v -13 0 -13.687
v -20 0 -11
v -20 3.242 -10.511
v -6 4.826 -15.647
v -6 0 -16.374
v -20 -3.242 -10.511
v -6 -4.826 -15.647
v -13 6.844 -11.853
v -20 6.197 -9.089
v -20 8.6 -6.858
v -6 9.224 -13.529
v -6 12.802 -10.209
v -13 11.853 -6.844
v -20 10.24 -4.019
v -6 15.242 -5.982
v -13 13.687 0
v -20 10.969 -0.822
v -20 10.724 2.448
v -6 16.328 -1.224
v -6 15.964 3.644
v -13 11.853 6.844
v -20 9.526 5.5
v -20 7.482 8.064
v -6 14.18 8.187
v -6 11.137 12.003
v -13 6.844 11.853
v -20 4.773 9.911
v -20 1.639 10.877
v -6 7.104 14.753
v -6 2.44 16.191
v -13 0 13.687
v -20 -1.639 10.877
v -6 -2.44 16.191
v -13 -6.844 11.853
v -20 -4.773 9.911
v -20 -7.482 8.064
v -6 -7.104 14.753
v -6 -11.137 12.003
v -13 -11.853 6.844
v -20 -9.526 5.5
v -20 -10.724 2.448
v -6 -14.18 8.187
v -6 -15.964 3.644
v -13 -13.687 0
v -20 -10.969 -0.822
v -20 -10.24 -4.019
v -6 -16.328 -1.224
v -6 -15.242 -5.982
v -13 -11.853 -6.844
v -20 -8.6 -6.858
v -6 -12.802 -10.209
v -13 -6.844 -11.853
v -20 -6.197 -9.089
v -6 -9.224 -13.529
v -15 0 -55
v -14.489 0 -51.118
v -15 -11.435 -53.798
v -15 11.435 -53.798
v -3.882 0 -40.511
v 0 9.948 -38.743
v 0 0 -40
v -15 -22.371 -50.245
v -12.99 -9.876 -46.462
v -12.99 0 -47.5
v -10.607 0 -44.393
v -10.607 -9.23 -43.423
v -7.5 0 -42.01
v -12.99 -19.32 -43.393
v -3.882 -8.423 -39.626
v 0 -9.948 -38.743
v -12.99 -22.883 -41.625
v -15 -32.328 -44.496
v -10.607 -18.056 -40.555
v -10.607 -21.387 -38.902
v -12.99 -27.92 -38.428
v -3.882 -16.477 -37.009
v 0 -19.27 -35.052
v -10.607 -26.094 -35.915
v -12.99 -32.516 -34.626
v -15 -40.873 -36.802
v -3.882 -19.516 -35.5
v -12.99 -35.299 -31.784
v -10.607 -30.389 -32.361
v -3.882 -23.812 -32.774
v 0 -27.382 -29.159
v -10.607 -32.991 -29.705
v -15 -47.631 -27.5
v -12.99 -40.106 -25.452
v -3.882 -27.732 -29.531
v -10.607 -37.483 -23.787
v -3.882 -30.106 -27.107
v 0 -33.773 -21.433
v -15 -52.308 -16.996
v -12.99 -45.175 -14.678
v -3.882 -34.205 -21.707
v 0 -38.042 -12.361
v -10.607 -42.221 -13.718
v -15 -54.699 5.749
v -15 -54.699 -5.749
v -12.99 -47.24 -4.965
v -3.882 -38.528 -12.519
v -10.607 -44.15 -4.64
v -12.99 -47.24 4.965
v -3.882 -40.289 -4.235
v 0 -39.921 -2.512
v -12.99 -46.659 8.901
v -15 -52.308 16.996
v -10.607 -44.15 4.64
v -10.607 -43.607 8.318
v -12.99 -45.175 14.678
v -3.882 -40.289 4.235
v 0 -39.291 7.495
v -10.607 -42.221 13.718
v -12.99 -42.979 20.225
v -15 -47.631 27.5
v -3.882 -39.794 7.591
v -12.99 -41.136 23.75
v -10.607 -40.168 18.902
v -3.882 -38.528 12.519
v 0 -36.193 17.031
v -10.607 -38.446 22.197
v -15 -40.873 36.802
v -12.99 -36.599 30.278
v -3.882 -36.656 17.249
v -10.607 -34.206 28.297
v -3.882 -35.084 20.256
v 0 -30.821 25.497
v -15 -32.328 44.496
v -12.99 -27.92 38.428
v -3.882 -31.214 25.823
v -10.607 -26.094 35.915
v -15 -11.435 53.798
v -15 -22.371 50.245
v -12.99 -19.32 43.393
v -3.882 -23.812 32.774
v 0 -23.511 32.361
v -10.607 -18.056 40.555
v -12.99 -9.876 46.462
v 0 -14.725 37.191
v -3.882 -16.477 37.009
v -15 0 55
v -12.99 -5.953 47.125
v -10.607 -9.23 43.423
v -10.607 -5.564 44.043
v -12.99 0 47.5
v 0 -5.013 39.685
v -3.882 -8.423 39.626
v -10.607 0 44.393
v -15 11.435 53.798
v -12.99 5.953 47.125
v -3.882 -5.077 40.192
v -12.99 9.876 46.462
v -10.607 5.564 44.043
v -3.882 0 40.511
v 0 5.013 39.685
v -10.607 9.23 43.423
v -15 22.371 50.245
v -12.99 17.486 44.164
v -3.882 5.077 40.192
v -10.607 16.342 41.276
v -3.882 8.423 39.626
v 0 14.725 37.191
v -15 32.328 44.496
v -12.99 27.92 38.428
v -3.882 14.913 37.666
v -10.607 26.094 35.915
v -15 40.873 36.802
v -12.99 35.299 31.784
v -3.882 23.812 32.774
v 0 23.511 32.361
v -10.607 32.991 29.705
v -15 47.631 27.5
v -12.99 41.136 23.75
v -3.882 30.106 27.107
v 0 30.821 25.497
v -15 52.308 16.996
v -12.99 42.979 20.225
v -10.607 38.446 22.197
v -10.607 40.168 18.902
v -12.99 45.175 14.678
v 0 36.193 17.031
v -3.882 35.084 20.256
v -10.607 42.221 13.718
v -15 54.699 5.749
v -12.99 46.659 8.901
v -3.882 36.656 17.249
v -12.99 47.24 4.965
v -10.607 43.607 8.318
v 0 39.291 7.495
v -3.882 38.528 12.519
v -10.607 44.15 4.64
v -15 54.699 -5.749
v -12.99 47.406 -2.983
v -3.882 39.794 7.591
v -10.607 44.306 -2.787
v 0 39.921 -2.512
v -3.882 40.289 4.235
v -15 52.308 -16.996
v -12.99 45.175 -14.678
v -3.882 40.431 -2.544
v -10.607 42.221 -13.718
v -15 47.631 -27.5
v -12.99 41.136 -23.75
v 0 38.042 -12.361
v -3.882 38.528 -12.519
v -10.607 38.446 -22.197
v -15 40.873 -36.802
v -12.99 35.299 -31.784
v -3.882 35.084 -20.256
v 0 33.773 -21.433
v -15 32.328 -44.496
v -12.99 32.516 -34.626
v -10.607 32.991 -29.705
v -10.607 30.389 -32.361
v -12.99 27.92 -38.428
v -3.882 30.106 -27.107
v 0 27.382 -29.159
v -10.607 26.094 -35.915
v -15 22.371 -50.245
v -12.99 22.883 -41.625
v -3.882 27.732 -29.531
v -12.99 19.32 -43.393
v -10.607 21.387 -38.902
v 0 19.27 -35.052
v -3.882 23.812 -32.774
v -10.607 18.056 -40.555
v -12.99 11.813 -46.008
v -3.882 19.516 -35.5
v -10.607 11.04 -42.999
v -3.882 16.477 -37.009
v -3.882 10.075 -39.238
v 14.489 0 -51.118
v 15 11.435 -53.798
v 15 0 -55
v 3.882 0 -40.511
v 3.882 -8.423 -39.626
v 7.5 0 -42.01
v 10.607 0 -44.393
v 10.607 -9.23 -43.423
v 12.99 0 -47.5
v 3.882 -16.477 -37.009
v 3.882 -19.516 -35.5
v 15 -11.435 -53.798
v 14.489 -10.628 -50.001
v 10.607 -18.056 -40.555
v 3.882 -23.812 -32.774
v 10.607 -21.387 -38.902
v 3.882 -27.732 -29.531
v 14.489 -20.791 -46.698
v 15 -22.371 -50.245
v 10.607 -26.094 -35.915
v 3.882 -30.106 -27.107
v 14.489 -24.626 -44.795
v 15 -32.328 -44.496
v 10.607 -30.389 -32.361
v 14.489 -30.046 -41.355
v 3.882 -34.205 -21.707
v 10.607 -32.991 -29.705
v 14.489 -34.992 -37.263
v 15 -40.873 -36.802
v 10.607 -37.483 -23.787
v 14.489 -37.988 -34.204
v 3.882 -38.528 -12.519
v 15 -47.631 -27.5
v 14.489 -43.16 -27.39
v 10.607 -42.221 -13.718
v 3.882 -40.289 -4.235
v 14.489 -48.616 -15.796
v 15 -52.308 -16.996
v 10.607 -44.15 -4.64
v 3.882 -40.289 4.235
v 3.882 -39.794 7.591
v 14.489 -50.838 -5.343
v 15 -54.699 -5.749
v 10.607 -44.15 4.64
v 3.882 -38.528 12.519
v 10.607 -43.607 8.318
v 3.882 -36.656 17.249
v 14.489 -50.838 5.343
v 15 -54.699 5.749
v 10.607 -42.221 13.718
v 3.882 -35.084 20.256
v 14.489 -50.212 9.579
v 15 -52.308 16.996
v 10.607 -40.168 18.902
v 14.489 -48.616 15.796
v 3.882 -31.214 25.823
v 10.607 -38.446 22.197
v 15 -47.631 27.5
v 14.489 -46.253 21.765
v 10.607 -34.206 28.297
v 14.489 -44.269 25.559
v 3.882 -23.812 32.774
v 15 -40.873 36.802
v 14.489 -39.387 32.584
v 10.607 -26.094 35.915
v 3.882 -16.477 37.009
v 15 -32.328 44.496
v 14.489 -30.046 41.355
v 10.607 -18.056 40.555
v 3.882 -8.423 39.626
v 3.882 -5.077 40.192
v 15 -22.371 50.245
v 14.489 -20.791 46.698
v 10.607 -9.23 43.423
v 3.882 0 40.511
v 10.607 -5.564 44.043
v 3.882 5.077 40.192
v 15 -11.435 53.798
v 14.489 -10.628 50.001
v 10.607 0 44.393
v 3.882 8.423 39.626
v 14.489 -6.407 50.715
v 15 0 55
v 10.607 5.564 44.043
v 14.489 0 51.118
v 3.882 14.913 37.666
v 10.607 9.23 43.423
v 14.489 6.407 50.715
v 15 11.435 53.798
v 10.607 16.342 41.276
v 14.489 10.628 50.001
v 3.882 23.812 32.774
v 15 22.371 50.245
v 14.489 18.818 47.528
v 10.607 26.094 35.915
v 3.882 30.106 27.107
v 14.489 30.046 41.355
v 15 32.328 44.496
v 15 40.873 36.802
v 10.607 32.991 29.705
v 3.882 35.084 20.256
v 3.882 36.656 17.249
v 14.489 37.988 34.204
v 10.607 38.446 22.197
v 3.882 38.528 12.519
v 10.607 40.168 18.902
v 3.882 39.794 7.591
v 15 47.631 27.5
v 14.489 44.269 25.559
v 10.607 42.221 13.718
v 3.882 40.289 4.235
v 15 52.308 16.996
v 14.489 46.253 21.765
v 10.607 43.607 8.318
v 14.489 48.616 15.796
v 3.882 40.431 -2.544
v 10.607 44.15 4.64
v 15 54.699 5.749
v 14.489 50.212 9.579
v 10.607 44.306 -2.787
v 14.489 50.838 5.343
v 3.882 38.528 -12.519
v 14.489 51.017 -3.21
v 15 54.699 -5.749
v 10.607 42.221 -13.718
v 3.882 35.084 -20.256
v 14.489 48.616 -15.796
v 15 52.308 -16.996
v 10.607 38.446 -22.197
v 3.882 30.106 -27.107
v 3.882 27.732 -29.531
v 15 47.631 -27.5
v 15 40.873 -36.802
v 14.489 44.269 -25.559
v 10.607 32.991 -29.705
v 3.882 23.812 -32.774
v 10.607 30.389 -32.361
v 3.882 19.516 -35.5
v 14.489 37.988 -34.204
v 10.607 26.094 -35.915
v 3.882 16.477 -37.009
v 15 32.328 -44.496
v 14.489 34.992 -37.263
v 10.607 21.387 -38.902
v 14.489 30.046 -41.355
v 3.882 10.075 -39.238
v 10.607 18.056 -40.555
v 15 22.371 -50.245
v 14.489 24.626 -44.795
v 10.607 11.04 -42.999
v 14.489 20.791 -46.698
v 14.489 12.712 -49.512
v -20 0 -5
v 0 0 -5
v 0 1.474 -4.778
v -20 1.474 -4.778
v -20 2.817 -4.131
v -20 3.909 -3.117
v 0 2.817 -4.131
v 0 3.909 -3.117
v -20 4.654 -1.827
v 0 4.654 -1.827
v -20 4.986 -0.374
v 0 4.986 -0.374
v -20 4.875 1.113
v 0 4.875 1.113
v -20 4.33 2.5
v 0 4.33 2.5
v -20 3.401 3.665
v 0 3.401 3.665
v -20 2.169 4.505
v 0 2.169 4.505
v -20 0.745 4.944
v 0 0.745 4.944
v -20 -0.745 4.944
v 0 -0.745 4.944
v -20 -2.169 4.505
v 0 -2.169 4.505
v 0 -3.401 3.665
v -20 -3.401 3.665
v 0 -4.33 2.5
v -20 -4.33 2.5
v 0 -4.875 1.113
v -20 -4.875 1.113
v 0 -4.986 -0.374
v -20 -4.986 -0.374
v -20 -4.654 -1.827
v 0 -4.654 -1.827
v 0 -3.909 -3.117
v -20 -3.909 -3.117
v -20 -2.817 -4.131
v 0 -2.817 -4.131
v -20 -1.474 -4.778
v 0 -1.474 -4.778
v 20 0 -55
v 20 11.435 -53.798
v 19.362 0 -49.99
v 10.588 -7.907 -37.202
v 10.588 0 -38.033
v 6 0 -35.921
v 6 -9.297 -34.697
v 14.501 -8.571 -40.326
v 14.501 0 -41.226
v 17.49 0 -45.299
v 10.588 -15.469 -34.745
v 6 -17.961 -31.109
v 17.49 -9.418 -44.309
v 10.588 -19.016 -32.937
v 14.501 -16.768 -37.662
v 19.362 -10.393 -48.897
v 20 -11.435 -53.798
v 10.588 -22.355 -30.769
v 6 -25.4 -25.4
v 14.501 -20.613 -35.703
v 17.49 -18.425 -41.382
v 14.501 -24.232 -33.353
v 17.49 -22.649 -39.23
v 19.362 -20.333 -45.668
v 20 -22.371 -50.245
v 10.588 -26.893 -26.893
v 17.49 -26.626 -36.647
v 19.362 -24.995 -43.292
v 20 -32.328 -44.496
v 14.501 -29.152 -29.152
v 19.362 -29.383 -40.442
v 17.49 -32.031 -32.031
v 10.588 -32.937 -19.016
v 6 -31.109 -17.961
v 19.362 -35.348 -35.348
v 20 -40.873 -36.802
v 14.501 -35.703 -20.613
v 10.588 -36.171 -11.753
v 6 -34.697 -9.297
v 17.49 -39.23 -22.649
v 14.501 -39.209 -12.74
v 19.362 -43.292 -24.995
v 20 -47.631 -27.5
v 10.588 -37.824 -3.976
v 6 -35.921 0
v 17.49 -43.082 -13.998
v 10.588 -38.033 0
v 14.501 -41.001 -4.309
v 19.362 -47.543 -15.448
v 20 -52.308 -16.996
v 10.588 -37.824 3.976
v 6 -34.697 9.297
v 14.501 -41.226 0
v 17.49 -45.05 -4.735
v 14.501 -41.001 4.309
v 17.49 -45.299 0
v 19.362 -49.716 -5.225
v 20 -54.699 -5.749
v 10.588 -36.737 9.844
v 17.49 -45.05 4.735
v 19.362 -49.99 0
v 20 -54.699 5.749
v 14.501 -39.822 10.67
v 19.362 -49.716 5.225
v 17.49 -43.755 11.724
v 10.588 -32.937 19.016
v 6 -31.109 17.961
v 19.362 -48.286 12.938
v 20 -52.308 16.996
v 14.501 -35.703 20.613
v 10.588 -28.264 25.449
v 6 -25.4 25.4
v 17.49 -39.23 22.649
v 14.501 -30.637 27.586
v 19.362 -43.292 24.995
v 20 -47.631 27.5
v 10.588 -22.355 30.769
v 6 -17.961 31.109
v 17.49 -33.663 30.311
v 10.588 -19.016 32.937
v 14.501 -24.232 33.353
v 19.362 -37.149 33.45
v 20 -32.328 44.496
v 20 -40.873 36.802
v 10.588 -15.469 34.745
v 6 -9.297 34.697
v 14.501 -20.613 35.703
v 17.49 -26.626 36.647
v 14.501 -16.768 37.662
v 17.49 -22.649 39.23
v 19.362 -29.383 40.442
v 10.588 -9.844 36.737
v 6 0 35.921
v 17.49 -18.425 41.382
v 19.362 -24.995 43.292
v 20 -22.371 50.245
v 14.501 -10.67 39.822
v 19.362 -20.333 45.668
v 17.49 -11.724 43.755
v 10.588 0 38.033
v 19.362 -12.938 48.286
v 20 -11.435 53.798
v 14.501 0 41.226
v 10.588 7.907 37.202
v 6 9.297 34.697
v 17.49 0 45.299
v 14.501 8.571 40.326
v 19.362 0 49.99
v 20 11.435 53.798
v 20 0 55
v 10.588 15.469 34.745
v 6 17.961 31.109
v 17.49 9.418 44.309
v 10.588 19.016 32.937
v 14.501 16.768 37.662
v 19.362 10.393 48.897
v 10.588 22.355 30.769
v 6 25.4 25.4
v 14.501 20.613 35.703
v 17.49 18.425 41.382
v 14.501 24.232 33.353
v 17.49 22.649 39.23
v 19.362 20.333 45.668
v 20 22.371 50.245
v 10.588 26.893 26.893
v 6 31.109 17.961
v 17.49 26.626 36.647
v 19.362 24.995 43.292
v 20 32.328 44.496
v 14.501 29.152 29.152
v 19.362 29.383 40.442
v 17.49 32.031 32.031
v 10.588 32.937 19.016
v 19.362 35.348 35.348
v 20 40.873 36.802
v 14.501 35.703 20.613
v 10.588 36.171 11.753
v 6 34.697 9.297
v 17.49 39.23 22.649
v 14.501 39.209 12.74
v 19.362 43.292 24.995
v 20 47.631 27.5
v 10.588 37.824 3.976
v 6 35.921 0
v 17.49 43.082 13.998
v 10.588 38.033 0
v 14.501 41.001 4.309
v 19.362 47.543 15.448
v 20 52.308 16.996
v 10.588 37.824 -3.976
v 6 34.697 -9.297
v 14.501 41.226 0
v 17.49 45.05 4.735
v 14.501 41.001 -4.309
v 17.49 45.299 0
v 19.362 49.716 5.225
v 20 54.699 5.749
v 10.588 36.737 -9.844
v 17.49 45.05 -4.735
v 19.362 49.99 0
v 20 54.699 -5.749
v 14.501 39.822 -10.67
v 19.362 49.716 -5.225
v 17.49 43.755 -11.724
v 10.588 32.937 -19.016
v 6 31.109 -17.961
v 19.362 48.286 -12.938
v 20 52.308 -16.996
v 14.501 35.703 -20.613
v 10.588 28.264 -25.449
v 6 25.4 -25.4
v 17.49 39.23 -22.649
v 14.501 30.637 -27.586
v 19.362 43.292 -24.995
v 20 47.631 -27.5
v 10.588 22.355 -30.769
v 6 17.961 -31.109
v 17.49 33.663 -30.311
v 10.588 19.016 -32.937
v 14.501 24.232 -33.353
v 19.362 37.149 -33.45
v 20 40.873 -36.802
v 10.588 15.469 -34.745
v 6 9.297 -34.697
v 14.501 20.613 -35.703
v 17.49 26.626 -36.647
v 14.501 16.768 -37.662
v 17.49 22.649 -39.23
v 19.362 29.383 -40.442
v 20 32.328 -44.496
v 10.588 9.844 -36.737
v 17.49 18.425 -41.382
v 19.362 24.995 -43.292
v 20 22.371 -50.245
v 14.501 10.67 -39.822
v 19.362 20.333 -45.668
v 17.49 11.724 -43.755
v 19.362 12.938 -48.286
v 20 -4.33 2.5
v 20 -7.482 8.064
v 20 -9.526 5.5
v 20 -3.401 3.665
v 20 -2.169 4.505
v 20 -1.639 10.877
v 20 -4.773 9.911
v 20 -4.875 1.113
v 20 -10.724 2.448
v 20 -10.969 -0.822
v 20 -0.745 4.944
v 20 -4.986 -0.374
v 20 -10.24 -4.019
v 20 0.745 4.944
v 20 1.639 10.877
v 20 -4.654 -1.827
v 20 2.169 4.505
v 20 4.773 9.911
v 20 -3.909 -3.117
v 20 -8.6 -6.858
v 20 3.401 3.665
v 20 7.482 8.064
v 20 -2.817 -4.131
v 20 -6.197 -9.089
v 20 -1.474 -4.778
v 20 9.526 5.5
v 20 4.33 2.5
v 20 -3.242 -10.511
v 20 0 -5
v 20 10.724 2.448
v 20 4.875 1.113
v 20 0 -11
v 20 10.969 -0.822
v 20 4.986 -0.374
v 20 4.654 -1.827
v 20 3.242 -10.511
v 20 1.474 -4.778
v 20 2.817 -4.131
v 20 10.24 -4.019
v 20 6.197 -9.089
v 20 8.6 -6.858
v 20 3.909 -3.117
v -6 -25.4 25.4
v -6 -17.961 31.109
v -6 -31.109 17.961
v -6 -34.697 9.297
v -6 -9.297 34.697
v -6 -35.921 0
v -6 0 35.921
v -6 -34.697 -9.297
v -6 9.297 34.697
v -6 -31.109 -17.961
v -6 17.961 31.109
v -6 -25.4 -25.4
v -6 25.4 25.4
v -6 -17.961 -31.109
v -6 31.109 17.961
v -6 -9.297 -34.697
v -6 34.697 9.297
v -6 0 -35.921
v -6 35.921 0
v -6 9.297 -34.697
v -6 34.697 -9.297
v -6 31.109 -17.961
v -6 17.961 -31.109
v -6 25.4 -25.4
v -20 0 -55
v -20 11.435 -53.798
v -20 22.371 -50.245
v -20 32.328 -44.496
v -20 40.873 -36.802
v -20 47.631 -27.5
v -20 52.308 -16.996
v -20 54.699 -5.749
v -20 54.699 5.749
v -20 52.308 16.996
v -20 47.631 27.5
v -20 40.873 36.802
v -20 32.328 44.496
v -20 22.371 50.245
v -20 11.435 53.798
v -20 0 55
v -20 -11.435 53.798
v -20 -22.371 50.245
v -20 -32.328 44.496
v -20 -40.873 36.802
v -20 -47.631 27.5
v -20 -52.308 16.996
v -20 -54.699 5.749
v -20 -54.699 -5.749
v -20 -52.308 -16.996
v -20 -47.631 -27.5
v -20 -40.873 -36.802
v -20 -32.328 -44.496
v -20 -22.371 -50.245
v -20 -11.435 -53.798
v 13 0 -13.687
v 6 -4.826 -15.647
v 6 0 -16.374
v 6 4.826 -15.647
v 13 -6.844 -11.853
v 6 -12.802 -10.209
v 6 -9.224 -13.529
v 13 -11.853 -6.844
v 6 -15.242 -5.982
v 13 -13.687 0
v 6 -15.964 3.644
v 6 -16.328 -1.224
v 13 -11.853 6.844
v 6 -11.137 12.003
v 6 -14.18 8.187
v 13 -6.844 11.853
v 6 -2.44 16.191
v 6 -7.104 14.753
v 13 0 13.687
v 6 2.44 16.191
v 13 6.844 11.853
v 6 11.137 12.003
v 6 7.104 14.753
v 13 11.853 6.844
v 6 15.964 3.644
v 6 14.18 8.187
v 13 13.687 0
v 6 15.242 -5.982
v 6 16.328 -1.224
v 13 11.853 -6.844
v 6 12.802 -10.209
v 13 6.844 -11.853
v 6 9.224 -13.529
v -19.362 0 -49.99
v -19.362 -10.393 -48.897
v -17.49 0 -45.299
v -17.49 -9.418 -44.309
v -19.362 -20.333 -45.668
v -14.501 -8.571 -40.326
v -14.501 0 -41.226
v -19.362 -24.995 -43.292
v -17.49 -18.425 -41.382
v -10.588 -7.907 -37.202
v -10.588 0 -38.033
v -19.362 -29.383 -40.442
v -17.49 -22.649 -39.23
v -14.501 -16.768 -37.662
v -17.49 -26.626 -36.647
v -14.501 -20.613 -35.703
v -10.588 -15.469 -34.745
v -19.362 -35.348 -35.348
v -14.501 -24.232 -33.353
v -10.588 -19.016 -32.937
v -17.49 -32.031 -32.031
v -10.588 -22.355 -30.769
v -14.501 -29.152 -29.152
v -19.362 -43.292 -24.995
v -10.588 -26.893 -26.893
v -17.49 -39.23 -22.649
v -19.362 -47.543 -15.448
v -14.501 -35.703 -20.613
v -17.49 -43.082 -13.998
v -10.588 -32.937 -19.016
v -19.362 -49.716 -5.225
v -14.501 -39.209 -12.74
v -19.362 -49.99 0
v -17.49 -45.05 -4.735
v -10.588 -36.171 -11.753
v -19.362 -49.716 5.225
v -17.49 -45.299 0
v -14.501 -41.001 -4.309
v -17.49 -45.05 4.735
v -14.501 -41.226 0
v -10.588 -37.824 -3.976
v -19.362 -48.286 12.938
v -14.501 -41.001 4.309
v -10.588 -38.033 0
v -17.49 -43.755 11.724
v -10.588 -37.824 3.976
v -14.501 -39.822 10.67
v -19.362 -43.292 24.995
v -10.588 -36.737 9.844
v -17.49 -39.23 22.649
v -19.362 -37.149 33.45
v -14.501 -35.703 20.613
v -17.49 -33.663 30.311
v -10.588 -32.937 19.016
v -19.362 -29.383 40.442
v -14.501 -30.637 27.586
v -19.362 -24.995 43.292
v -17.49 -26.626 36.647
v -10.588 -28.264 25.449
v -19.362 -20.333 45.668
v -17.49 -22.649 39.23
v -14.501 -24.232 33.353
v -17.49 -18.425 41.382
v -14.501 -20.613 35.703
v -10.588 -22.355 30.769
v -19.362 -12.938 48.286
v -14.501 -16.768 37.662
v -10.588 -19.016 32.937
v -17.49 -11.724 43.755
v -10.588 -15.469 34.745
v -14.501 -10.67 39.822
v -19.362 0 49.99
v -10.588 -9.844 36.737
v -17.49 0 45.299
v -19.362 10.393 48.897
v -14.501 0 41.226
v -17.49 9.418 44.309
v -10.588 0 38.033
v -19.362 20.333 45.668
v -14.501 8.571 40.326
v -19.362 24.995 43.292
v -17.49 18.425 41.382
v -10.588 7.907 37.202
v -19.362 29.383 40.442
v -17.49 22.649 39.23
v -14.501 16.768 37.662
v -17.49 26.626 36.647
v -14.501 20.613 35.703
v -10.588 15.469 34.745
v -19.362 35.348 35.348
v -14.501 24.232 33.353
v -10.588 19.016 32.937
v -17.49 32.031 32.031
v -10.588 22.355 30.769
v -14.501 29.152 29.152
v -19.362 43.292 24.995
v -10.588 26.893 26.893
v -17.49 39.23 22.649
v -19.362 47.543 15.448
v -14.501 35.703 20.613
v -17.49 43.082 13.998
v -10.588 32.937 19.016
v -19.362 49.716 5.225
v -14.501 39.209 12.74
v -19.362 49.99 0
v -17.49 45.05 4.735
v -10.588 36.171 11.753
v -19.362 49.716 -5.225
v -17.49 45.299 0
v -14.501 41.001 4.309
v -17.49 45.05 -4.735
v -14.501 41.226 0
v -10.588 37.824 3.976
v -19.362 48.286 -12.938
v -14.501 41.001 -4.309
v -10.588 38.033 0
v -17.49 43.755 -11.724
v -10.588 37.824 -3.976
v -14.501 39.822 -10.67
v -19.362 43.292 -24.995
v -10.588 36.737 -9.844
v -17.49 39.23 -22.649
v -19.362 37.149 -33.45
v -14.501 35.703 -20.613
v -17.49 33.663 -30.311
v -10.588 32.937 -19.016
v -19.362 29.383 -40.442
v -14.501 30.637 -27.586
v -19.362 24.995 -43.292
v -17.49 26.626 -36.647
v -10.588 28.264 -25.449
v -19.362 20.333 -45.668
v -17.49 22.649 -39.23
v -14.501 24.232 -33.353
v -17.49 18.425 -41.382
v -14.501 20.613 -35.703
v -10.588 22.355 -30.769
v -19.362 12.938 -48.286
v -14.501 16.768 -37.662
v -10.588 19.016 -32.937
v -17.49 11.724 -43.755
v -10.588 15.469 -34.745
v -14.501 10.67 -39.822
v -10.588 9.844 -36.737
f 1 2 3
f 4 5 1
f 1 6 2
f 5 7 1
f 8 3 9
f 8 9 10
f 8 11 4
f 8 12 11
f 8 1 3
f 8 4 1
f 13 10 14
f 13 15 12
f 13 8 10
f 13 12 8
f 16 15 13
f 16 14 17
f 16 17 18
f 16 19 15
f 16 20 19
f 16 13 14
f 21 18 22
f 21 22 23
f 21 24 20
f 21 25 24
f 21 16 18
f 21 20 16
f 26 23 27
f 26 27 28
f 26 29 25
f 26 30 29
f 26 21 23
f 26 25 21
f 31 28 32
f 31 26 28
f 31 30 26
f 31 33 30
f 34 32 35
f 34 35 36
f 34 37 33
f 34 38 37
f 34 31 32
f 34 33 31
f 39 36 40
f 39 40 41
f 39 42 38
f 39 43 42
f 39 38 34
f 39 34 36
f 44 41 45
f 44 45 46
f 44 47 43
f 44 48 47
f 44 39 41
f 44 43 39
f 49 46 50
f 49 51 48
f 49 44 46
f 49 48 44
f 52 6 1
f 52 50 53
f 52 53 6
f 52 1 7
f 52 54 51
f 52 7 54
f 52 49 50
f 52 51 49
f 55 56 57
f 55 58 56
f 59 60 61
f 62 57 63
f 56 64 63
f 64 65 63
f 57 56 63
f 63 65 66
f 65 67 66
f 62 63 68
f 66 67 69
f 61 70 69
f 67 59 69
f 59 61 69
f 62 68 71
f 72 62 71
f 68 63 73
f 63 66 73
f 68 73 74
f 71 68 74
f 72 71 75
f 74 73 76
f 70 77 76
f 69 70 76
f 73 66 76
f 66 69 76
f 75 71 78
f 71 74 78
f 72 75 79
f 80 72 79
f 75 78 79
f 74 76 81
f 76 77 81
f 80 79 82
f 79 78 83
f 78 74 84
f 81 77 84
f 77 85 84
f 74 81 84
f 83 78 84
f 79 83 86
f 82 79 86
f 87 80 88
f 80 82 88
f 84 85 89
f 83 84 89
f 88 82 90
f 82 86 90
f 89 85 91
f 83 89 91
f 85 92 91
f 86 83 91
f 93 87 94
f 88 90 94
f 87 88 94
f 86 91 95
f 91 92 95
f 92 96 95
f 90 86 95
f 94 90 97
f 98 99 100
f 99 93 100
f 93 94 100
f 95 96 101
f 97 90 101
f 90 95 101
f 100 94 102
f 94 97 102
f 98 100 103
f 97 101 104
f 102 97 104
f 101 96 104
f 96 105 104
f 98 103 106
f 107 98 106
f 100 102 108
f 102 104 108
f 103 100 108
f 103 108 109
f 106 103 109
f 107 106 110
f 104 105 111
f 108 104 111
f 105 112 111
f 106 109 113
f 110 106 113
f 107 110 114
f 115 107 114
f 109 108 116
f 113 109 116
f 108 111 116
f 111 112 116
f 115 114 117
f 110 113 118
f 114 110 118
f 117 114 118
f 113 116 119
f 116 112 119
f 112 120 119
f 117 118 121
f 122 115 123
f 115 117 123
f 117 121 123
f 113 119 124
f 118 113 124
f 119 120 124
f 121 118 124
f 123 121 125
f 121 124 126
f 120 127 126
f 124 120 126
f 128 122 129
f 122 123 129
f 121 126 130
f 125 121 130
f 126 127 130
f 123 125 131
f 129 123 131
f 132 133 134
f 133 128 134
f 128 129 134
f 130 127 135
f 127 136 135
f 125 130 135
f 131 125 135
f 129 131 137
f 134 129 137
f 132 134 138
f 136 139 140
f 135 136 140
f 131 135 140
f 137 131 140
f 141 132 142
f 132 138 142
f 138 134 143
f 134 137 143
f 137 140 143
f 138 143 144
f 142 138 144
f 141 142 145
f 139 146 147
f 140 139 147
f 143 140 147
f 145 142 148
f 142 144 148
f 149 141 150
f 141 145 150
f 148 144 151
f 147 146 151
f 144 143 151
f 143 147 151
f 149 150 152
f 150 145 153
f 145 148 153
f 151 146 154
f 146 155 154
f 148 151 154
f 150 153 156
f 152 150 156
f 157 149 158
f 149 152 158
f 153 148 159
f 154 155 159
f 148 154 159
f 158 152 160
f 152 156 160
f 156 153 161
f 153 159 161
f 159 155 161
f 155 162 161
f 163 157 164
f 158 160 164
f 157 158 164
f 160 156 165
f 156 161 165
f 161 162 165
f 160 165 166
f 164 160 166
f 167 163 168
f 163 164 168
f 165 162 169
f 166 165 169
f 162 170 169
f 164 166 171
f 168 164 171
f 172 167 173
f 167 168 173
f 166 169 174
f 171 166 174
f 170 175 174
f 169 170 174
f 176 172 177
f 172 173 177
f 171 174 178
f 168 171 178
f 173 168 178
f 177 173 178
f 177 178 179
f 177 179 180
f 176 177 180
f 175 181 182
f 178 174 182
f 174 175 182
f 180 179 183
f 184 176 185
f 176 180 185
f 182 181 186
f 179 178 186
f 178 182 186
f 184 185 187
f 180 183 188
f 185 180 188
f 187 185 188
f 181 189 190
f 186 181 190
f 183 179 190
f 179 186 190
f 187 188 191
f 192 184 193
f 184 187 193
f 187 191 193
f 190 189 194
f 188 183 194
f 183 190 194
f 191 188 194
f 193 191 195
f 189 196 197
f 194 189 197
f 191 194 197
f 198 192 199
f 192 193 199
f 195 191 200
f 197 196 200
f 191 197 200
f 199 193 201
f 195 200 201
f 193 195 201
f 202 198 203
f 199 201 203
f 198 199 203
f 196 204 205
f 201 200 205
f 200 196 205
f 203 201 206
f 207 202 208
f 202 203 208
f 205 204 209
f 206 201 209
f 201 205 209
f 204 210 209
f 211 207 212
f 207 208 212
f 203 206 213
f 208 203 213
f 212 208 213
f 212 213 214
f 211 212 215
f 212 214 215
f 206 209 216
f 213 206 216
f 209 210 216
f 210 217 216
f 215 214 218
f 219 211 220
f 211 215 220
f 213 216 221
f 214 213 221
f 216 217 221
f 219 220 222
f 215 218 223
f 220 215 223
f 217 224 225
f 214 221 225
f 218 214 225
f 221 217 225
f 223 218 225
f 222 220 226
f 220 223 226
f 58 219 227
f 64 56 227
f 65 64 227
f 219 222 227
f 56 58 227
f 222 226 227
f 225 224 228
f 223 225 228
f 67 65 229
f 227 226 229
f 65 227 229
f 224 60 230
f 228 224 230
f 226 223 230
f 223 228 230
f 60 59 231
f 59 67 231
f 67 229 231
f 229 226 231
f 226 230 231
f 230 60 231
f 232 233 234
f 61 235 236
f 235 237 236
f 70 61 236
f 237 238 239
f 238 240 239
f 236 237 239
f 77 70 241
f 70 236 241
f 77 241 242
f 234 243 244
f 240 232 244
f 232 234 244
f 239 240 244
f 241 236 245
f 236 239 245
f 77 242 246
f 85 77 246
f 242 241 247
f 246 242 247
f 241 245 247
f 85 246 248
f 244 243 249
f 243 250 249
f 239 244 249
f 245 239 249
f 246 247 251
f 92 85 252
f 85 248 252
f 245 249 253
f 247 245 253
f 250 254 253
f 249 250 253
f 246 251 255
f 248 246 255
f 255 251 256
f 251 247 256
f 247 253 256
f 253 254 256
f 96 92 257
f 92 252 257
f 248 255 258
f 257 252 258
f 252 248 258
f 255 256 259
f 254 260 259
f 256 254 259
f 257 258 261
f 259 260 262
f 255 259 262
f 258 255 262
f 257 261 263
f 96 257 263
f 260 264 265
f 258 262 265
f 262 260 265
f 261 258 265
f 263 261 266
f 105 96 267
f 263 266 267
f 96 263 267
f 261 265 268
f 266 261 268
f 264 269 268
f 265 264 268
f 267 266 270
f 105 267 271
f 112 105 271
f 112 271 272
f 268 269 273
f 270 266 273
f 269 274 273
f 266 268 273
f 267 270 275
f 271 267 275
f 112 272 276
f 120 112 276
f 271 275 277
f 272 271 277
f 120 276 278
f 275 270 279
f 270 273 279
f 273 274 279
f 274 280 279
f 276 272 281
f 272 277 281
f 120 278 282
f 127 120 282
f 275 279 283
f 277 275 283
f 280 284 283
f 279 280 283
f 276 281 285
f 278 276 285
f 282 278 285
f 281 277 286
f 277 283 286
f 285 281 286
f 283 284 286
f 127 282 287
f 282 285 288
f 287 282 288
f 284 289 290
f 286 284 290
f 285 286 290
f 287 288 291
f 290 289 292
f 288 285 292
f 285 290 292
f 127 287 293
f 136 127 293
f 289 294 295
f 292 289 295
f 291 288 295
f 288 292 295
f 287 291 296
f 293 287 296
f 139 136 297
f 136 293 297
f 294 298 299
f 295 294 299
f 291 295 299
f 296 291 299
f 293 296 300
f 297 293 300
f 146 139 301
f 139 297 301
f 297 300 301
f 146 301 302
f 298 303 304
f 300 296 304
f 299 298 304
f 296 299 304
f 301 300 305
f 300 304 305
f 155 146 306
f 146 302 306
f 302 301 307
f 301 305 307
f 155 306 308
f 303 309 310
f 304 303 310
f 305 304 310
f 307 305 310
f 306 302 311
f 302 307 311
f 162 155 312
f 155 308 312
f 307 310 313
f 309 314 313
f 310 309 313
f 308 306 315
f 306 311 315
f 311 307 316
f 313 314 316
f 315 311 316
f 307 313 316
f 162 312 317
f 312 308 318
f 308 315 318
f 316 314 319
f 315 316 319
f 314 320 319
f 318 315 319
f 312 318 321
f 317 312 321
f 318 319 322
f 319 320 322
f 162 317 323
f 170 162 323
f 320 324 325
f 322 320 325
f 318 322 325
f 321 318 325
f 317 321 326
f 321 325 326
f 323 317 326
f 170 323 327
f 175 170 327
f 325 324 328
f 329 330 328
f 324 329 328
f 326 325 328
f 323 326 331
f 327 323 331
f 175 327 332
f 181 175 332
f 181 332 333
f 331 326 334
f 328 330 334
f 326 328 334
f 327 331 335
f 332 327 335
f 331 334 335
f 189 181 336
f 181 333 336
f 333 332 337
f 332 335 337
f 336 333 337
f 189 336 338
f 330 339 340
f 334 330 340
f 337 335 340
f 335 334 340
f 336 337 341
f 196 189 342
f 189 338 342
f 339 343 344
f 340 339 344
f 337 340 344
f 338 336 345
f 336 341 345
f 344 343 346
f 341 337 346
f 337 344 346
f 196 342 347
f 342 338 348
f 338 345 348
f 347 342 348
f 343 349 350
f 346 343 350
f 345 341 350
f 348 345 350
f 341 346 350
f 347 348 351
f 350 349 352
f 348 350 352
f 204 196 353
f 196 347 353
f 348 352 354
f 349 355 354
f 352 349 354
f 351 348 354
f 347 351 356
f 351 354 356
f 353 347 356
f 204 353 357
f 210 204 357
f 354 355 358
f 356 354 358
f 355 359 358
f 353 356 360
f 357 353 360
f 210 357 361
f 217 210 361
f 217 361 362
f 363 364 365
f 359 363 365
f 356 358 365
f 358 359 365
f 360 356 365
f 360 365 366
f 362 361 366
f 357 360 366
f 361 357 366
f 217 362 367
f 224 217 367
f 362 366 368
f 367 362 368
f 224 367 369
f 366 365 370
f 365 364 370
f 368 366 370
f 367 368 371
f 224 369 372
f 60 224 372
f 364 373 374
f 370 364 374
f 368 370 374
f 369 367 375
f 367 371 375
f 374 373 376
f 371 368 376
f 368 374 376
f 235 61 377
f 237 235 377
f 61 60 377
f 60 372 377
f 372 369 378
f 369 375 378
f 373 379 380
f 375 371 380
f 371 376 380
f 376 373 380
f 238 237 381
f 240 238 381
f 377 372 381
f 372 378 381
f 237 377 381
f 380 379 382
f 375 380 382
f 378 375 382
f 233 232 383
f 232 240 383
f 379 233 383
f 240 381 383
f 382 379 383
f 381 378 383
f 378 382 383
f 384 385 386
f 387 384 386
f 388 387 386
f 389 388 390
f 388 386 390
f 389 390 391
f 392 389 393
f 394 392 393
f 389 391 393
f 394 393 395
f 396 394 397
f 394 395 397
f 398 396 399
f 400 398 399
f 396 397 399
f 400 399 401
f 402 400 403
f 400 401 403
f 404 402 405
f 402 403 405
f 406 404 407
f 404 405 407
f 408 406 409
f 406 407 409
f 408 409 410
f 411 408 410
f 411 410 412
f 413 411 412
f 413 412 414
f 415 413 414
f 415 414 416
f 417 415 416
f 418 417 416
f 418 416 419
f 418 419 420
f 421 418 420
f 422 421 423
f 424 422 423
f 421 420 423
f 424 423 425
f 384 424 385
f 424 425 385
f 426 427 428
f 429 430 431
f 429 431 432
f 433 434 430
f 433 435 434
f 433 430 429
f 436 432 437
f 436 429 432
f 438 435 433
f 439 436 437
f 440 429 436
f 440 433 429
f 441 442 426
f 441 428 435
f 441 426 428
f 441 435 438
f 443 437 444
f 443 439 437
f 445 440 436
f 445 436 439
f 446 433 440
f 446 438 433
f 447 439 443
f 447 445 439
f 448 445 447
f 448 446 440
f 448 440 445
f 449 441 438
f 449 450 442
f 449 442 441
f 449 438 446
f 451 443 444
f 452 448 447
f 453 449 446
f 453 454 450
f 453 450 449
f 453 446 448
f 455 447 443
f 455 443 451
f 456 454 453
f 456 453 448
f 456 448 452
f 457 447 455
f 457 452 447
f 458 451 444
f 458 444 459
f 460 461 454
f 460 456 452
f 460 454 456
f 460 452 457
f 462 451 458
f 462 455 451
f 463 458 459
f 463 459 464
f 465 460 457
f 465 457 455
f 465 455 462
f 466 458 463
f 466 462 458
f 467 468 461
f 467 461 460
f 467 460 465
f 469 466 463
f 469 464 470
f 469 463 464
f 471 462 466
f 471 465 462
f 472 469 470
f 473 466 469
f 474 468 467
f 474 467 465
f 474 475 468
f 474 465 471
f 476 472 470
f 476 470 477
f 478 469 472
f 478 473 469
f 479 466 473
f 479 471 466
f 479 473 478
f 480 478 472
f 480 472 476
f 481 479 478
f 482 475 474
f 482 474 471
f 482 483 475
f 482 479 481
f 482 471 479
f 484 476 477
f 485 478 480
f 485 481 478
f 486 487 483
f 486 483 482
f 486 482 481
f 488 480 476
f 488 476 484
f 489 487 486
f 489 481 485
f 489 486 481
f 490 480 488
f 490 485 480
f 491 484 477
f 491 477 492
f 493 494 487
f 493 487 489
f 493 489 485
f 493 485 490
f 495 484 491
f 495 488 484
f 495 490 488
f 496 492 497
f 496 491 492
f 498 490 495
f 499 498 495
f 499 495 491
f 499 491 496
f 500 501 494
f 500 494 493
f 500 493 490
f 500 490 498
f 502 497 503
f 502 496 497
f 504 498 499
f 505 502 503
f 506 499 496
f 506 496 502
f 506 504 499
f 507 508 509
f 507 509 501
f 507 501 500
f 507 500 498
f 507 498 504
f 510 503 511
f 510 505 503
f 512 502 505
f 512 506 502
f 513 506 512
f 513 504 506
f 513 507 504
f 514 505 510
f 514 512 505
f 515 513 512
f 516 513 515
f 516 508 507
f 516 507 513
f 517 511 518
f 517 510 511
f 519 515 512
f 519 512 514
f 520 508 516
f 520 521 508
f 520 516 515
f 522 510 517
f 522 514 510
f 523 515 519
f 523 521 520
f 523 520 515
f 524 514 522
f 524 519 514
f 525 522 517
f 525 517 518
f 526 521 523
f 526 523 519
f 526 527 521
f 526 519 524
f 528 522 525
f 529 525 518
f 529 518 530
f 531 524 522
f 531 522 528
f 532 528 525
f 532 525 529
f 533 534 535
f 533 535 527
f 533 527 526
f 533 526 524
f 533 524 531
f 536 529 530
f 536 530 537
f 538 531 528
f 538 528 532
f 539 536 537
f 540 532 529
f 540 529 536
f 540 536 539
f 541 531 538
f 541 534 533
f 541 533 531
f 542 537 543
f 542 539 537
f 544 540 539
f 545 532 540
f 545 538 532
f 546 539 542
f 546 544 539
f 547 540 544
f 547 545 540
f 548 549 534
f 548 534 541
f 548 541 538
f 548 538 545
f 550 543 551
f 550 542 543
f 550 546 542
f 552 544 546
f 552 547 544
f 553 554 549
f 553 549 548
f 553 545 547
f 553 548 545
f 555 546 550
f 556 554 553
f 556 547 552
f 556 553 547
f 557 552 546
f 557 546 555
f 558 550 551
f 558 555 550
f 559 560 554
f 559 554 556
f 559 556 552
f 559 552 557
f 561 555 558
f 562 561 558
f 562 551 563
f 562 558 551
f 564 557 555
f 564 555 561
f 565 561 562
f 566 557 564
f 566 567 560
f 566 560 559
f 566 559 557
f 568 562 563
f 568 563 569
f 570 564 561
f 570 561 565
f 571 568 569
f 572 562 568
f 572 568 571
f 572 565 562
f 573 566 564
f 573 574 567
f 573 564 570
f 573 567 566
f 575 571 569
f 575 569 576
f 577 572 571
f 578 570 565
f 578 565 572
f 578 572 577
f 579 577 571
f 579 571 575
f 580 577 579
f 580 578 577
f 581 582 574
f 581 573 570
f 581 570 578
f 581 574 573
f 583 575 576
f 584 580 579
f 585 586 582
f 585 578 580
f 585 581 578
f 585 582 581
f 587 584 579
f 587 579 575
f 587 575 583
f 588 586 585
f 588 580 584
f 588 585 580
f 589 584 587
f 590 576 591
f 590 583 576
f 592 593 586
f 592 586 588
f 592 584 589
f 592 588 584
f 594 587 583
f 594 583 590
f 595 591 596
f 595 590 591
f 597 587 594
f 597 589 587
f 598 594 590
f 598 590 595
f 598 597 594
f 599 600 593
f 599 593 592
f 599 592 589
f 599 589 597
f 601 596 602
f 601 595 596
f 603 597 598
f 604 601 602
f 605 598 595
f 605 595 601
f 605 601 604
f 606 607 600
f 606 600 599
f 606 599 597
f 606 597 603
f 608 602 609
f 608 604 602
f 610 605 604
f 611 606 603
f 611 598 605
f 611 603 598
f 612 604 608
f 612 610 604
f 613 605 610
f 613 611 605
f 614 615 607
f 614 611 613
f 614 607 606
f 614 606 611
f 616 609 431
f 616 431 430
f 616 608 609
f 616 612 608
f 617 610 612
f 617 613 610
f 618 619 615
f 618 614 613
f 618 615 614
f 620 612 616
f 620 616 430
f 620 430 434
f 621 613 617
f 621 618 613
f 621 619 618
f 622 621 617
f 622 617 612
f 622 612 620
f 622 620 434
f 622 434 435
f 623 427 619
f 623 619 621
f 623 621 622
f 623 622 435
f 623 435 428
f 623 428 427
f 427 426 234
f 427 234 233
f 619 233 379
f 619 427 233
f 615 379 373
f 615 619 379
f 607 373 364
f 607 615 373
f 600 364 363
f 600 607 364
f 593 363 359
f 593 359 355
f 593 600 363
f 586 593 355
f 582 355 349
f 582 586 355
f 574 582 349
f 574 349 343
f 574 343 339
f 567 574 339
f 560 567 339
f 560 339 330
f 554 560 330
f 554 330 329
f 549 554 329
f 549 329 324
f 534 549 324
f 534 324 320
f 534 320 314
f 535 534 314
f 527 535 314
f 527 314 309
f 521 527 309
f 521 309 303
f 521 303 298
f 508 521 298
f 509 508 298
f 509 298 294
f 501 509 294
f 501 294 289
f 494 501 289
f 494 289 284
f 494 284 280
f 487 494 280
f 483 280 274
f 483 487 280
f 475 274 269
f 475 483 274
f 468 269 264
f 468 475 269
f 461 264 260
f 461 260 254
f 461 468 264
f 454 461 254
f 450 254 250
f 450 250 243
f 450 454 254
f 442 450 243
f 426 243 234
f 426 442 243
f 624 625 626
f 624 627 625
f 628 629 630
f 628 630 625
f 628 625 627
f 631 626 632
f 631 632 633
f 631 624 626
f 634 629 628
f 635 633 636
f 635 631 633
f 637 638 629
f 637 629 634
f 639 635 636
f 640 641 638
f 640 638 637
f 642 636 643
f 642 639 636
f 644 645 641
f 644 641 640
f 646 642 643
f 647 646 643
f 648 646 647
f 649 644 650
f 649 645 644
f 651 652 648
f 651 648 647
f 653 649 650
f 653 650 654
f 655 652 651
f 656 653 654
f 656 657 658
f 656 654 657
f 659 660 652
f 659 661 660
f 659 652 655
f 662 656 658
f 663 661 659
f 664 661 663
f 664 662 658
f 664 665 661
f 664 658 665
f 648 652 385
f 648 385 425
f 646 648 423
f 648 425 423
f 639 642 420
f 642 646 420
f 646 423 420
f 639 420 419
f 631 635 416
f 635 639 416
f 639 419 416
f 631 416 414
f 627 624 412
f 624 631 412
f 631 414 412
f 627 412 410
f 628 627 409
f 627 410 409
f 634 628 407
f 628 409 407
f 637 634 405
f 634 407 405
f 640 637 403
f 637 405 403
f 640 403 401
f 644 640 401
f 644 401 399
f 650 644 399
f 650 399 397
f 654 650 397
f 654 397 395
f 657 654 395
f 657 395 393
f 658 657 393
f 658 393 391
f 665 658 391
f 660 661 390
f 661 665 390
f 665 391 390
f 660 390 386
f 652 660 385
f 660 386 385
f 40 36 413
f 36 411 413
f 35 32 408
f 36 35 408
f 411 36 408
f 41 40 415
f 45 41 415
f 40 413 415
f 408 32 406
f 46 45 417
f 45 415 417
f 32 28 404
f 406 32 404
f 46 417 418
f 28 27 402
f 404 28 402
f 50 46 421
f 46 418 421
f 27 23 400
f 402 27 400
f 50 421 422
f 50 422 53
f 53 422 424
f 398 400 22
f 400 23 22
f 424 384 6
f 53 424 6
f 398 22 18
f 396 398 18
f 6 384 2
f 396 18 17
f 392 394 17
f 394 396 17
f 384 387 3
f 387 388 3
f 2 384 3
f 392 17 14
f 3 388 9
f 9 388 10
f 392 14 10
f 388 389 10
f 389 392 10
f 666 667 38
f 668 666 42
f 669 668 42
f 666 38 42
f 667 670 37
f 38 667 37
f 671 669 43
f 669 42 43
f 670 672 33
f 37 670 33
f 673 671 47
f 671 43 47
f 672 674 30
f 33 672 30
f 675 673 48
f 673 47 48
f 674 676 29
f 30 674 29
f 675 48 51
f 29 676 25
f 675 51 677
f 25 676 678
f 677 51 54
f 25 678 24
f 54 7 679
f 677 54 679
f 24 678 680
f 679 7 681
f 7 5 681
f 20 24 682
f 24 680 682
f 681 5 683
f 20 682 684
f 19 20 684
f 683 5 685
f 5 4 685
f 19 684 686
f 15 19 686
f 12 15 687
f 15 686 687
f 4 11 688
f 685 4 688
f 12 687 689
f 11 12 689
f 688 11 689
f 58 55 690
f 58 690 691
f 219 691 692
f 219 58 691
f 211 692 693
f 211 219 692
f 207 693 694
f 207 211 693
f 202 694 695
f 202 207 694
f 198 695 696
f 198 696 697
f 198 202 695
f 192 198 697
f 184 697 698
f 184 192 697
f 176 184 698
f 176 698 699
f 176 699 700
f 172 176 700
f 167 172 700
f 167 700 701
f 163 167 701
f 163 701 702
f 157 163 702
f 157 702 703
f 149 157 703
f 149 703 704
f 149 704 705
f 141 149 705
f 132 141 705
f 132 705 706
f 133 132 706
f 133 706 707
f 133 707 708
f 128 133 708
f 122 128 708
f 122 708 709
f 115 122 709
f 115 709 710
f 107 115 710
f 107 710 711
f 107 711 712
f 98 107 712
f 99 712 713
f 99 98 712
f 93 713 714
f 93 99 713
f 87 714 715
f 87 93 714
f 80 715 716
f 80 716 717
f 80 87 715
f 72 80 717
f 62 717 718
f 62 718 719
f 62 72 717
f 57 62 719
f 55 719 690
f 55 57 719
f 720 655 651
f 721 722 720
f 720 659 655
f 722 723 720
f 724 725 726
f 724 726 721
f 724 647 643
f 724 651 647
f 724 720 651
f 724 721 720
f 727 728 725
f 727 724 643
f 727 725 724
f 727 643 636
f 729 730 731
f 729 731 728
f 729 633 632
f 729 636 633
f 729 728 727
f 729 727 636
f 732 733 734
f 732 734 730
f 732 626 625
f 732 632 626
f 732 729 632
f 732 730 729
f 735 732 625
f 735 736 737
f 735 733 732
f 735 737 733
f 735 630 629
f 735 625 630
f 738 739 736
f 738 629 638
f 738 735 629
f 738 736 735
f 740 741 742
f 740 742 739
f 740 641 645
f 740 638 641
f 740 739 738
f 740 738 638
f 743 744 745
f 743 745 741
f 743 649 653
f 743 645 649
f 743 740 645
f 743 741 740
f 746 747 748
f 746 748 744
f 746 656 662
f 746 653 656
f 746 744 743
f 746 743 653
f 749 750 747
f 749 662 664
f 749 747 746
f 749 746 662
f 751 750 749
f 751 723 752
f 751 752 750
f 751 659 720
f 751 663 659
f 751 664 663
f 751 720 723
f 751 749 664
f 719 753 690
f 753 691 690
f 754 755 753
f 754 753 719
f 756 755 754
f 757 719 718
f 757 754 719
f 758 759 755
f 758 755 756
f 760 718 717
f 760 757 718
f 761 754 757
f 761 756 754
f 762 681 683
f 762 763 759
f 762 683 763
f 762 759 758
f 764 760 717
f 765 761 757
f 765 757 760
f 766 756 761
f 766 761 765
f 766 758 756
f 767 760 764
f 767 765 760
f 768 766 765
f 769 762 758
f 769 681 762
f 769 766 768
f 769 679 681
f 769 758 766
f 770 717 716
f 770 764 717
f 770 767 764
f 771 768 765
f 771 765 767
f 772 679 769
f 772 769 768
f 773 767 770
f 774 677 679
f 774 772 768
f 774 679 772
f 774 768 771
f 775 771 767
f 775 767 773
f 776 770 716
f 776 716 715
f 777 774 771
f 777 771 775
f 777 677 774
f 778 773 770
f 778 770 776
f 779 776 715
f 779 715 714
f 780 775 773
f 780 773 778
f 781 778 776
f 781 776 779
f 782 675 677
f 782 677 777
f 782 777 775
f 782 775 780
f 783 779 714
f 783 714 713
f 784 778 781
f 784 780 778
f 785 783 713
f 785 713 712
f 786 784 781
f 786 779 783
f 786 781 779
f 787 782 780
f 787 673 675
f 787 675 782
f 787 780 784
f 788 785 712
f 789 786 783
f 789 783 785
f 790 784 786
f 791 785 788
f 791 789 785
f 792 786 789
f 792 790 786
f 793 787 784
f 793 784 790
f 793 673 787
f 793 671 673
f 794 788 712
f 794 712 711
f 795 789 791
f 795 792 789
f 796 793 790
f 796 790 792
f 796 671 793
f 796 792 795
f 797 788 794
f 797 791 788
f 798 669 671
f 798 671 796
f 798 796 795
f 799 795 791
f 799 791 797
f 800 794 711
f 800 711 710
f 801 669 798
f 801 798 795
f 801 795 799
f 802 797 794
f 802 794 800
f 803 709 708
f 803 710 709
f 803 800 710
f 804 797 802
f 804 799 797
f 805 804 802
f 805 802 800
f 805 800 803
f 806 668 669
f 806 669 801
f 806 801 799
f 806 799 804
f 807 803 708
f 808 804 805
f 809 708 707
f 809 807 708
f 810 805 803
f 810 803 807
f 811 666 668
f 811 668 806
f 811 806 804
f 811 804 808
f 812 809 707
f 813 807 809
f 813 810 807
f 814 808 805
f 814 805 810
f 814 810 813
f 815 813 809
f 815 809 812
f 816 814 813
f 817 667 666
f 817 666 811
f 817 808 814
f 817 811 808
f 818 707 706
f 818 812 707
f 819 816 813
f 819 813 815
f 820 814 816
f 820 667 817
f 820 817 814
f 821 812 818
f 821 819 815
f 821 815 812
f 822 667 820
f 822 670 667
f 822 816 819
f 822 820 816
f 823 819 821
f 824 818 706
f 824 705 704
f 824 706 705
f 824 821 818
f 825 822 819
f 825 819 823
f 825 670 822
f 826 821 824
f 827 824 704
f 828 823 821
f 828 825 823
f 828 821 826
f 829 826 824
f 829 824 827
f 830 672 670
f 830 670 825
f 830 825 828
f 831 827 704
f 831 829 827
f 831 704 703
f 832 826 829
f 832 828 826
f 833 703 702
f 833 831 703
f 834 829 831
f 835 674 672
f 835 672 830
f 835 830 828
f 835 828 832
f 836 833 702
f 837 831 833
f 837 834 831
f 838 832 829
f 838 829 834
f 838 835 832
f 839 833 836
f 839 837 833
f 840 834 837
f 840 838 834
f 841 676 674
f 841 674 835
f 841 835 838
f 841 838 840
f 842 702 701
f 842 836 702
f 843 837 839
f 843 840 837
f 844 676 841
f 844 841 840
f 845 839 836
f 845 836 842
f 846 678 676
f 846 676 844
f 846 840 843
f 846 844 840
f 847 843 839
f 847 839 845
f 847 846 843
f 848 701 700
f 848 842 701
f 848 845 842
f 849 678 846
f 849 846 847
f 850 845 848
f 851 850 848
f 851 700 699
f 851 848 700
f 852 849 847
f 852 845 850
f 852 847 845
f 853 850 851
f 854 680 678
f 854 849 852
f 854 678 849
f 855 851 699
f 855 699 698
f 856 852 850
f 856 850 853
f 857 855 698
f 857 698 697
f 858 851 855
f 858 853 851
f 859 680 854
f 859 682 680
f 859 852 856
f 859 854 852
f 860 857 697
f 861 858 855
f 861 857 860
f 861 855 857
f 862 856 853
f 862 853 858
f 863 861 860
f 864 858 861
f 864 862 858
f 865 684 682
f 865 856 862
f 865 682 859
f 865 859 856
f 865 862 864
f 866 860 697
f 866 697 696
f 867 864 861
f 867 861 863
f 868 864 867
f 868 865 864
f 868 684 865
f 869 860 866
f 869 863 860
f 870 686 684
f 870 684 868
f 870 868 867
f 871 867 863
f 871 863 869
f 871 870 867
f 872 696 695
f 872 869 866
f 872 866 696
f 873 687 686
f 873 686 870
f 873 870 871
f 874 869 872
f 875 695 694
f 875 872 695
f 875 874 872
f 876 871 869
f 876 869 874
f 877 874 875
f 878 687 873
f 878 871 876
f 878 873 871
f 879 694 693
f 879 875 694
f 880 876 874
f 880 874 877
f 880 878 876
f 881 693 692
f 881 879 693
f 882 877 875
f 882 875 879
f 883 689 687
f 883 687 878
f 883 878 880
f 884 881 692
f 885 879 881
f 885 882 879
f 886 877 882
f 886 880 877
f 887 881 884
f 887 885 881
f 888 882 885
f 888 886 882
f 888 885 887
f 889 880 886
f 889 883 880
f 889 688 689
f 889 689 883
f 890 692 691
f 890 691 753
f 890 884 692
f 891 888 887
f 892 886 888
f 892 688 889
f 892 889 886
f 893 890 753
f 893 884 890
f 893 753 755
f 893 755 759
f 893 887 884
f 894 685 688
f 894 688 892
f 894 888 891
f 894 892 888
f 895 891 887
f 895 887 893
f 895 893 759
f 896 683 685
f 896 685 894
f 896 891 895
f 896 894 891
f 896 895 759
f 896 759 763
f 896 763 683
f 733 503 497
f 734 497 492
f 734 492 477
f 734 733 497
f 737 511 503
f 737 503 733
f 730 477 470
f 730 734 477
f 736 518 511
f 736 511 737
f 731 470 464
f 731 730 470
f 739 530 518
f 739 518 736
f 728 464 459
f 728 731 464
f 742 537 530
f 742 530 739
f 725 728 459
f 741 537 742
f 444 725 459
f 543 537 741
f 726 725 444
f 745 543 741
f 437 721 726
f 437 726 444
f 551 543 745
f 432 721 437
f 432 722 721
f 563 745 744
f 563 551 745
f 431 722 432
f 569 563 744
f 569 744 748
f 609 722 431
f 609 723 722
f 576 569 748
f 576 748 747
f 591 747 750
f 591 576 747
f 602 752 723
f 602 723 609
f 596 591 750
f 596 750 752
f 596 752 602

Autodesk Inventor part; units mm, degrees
ref_plane "YZ Plane" through (0, 0, 0) normal (1, 0, 0) x (0, 1, 0)
ref_plane "XZ Plane" through (0, 0, 0) normal (0, 1, 0) x (-1, 0, 0)
ref_plane "XY Plane" through (0, 0, 0) normal (0, 0, 1) x (1, 0, 0)
sketch "Náčrt1" plane through (0, 0, 0) normal (0, 1, 0) x (-1, 0, 0)
  line L0 (20, -5) -> (0, -5)
  line L1 (20, -5) -> (20, -11)
  line L2 (20, -11) -> (6, -16.3741)
  line L3 (6, -16.3741) -> (6, -35.9212)
  line L4 (0, 0) -> (-43.8955, 0)
  arc A0 (20, -55) -> (6, -35.9212) centre (0, -55) ccw
  line L5 (0, 0) -> (0, -73.1539)
  line L6 (20, -55) -> (15, -55)
  arc A1 (15, -55) -> (0, -40) centre (0, -55) ccw
  line L7 (24.648, -55) -> (-37.389, -55)
  line L8 (20, -55) -> (20, -66.6969)
  line L9 (-20, -5) -> (0, -5)
  line L10 (-20, -5) -> (-20, -11)
  line L11 (-20, -11) -> (-6, -16.3741)
  line L12 (-6, -16.3741) -> (-6, -35.9212)
  arc A2 (-6, -35.9212) -> (-20, -55) centre (0, -55) ccw
  line L13 (-20, -55) -> (-15, -55)
  arc A3 (0, -40) -> (-15, -55) centre (0, -55) ccw
  point P0 (0, -53)
  dimension "d1" = 111
  dimension "d3" = 10
  dimension "d63" = 20
  dimension "d64" = 15
  dimension "d65" = 12
  dimension "d67" = 80
  dimension "d68" = 6
revolve "Rotace1" add sketch "Náčrt1" angle 360 about axis through (0, 0, 0) along (1, 0, 0) contours L1 L2 L3 A0 L6 A1 L5 L0 | L5 A3 L7 A2 L12 L11 L10 L9
properties part number "pulley_dc"
